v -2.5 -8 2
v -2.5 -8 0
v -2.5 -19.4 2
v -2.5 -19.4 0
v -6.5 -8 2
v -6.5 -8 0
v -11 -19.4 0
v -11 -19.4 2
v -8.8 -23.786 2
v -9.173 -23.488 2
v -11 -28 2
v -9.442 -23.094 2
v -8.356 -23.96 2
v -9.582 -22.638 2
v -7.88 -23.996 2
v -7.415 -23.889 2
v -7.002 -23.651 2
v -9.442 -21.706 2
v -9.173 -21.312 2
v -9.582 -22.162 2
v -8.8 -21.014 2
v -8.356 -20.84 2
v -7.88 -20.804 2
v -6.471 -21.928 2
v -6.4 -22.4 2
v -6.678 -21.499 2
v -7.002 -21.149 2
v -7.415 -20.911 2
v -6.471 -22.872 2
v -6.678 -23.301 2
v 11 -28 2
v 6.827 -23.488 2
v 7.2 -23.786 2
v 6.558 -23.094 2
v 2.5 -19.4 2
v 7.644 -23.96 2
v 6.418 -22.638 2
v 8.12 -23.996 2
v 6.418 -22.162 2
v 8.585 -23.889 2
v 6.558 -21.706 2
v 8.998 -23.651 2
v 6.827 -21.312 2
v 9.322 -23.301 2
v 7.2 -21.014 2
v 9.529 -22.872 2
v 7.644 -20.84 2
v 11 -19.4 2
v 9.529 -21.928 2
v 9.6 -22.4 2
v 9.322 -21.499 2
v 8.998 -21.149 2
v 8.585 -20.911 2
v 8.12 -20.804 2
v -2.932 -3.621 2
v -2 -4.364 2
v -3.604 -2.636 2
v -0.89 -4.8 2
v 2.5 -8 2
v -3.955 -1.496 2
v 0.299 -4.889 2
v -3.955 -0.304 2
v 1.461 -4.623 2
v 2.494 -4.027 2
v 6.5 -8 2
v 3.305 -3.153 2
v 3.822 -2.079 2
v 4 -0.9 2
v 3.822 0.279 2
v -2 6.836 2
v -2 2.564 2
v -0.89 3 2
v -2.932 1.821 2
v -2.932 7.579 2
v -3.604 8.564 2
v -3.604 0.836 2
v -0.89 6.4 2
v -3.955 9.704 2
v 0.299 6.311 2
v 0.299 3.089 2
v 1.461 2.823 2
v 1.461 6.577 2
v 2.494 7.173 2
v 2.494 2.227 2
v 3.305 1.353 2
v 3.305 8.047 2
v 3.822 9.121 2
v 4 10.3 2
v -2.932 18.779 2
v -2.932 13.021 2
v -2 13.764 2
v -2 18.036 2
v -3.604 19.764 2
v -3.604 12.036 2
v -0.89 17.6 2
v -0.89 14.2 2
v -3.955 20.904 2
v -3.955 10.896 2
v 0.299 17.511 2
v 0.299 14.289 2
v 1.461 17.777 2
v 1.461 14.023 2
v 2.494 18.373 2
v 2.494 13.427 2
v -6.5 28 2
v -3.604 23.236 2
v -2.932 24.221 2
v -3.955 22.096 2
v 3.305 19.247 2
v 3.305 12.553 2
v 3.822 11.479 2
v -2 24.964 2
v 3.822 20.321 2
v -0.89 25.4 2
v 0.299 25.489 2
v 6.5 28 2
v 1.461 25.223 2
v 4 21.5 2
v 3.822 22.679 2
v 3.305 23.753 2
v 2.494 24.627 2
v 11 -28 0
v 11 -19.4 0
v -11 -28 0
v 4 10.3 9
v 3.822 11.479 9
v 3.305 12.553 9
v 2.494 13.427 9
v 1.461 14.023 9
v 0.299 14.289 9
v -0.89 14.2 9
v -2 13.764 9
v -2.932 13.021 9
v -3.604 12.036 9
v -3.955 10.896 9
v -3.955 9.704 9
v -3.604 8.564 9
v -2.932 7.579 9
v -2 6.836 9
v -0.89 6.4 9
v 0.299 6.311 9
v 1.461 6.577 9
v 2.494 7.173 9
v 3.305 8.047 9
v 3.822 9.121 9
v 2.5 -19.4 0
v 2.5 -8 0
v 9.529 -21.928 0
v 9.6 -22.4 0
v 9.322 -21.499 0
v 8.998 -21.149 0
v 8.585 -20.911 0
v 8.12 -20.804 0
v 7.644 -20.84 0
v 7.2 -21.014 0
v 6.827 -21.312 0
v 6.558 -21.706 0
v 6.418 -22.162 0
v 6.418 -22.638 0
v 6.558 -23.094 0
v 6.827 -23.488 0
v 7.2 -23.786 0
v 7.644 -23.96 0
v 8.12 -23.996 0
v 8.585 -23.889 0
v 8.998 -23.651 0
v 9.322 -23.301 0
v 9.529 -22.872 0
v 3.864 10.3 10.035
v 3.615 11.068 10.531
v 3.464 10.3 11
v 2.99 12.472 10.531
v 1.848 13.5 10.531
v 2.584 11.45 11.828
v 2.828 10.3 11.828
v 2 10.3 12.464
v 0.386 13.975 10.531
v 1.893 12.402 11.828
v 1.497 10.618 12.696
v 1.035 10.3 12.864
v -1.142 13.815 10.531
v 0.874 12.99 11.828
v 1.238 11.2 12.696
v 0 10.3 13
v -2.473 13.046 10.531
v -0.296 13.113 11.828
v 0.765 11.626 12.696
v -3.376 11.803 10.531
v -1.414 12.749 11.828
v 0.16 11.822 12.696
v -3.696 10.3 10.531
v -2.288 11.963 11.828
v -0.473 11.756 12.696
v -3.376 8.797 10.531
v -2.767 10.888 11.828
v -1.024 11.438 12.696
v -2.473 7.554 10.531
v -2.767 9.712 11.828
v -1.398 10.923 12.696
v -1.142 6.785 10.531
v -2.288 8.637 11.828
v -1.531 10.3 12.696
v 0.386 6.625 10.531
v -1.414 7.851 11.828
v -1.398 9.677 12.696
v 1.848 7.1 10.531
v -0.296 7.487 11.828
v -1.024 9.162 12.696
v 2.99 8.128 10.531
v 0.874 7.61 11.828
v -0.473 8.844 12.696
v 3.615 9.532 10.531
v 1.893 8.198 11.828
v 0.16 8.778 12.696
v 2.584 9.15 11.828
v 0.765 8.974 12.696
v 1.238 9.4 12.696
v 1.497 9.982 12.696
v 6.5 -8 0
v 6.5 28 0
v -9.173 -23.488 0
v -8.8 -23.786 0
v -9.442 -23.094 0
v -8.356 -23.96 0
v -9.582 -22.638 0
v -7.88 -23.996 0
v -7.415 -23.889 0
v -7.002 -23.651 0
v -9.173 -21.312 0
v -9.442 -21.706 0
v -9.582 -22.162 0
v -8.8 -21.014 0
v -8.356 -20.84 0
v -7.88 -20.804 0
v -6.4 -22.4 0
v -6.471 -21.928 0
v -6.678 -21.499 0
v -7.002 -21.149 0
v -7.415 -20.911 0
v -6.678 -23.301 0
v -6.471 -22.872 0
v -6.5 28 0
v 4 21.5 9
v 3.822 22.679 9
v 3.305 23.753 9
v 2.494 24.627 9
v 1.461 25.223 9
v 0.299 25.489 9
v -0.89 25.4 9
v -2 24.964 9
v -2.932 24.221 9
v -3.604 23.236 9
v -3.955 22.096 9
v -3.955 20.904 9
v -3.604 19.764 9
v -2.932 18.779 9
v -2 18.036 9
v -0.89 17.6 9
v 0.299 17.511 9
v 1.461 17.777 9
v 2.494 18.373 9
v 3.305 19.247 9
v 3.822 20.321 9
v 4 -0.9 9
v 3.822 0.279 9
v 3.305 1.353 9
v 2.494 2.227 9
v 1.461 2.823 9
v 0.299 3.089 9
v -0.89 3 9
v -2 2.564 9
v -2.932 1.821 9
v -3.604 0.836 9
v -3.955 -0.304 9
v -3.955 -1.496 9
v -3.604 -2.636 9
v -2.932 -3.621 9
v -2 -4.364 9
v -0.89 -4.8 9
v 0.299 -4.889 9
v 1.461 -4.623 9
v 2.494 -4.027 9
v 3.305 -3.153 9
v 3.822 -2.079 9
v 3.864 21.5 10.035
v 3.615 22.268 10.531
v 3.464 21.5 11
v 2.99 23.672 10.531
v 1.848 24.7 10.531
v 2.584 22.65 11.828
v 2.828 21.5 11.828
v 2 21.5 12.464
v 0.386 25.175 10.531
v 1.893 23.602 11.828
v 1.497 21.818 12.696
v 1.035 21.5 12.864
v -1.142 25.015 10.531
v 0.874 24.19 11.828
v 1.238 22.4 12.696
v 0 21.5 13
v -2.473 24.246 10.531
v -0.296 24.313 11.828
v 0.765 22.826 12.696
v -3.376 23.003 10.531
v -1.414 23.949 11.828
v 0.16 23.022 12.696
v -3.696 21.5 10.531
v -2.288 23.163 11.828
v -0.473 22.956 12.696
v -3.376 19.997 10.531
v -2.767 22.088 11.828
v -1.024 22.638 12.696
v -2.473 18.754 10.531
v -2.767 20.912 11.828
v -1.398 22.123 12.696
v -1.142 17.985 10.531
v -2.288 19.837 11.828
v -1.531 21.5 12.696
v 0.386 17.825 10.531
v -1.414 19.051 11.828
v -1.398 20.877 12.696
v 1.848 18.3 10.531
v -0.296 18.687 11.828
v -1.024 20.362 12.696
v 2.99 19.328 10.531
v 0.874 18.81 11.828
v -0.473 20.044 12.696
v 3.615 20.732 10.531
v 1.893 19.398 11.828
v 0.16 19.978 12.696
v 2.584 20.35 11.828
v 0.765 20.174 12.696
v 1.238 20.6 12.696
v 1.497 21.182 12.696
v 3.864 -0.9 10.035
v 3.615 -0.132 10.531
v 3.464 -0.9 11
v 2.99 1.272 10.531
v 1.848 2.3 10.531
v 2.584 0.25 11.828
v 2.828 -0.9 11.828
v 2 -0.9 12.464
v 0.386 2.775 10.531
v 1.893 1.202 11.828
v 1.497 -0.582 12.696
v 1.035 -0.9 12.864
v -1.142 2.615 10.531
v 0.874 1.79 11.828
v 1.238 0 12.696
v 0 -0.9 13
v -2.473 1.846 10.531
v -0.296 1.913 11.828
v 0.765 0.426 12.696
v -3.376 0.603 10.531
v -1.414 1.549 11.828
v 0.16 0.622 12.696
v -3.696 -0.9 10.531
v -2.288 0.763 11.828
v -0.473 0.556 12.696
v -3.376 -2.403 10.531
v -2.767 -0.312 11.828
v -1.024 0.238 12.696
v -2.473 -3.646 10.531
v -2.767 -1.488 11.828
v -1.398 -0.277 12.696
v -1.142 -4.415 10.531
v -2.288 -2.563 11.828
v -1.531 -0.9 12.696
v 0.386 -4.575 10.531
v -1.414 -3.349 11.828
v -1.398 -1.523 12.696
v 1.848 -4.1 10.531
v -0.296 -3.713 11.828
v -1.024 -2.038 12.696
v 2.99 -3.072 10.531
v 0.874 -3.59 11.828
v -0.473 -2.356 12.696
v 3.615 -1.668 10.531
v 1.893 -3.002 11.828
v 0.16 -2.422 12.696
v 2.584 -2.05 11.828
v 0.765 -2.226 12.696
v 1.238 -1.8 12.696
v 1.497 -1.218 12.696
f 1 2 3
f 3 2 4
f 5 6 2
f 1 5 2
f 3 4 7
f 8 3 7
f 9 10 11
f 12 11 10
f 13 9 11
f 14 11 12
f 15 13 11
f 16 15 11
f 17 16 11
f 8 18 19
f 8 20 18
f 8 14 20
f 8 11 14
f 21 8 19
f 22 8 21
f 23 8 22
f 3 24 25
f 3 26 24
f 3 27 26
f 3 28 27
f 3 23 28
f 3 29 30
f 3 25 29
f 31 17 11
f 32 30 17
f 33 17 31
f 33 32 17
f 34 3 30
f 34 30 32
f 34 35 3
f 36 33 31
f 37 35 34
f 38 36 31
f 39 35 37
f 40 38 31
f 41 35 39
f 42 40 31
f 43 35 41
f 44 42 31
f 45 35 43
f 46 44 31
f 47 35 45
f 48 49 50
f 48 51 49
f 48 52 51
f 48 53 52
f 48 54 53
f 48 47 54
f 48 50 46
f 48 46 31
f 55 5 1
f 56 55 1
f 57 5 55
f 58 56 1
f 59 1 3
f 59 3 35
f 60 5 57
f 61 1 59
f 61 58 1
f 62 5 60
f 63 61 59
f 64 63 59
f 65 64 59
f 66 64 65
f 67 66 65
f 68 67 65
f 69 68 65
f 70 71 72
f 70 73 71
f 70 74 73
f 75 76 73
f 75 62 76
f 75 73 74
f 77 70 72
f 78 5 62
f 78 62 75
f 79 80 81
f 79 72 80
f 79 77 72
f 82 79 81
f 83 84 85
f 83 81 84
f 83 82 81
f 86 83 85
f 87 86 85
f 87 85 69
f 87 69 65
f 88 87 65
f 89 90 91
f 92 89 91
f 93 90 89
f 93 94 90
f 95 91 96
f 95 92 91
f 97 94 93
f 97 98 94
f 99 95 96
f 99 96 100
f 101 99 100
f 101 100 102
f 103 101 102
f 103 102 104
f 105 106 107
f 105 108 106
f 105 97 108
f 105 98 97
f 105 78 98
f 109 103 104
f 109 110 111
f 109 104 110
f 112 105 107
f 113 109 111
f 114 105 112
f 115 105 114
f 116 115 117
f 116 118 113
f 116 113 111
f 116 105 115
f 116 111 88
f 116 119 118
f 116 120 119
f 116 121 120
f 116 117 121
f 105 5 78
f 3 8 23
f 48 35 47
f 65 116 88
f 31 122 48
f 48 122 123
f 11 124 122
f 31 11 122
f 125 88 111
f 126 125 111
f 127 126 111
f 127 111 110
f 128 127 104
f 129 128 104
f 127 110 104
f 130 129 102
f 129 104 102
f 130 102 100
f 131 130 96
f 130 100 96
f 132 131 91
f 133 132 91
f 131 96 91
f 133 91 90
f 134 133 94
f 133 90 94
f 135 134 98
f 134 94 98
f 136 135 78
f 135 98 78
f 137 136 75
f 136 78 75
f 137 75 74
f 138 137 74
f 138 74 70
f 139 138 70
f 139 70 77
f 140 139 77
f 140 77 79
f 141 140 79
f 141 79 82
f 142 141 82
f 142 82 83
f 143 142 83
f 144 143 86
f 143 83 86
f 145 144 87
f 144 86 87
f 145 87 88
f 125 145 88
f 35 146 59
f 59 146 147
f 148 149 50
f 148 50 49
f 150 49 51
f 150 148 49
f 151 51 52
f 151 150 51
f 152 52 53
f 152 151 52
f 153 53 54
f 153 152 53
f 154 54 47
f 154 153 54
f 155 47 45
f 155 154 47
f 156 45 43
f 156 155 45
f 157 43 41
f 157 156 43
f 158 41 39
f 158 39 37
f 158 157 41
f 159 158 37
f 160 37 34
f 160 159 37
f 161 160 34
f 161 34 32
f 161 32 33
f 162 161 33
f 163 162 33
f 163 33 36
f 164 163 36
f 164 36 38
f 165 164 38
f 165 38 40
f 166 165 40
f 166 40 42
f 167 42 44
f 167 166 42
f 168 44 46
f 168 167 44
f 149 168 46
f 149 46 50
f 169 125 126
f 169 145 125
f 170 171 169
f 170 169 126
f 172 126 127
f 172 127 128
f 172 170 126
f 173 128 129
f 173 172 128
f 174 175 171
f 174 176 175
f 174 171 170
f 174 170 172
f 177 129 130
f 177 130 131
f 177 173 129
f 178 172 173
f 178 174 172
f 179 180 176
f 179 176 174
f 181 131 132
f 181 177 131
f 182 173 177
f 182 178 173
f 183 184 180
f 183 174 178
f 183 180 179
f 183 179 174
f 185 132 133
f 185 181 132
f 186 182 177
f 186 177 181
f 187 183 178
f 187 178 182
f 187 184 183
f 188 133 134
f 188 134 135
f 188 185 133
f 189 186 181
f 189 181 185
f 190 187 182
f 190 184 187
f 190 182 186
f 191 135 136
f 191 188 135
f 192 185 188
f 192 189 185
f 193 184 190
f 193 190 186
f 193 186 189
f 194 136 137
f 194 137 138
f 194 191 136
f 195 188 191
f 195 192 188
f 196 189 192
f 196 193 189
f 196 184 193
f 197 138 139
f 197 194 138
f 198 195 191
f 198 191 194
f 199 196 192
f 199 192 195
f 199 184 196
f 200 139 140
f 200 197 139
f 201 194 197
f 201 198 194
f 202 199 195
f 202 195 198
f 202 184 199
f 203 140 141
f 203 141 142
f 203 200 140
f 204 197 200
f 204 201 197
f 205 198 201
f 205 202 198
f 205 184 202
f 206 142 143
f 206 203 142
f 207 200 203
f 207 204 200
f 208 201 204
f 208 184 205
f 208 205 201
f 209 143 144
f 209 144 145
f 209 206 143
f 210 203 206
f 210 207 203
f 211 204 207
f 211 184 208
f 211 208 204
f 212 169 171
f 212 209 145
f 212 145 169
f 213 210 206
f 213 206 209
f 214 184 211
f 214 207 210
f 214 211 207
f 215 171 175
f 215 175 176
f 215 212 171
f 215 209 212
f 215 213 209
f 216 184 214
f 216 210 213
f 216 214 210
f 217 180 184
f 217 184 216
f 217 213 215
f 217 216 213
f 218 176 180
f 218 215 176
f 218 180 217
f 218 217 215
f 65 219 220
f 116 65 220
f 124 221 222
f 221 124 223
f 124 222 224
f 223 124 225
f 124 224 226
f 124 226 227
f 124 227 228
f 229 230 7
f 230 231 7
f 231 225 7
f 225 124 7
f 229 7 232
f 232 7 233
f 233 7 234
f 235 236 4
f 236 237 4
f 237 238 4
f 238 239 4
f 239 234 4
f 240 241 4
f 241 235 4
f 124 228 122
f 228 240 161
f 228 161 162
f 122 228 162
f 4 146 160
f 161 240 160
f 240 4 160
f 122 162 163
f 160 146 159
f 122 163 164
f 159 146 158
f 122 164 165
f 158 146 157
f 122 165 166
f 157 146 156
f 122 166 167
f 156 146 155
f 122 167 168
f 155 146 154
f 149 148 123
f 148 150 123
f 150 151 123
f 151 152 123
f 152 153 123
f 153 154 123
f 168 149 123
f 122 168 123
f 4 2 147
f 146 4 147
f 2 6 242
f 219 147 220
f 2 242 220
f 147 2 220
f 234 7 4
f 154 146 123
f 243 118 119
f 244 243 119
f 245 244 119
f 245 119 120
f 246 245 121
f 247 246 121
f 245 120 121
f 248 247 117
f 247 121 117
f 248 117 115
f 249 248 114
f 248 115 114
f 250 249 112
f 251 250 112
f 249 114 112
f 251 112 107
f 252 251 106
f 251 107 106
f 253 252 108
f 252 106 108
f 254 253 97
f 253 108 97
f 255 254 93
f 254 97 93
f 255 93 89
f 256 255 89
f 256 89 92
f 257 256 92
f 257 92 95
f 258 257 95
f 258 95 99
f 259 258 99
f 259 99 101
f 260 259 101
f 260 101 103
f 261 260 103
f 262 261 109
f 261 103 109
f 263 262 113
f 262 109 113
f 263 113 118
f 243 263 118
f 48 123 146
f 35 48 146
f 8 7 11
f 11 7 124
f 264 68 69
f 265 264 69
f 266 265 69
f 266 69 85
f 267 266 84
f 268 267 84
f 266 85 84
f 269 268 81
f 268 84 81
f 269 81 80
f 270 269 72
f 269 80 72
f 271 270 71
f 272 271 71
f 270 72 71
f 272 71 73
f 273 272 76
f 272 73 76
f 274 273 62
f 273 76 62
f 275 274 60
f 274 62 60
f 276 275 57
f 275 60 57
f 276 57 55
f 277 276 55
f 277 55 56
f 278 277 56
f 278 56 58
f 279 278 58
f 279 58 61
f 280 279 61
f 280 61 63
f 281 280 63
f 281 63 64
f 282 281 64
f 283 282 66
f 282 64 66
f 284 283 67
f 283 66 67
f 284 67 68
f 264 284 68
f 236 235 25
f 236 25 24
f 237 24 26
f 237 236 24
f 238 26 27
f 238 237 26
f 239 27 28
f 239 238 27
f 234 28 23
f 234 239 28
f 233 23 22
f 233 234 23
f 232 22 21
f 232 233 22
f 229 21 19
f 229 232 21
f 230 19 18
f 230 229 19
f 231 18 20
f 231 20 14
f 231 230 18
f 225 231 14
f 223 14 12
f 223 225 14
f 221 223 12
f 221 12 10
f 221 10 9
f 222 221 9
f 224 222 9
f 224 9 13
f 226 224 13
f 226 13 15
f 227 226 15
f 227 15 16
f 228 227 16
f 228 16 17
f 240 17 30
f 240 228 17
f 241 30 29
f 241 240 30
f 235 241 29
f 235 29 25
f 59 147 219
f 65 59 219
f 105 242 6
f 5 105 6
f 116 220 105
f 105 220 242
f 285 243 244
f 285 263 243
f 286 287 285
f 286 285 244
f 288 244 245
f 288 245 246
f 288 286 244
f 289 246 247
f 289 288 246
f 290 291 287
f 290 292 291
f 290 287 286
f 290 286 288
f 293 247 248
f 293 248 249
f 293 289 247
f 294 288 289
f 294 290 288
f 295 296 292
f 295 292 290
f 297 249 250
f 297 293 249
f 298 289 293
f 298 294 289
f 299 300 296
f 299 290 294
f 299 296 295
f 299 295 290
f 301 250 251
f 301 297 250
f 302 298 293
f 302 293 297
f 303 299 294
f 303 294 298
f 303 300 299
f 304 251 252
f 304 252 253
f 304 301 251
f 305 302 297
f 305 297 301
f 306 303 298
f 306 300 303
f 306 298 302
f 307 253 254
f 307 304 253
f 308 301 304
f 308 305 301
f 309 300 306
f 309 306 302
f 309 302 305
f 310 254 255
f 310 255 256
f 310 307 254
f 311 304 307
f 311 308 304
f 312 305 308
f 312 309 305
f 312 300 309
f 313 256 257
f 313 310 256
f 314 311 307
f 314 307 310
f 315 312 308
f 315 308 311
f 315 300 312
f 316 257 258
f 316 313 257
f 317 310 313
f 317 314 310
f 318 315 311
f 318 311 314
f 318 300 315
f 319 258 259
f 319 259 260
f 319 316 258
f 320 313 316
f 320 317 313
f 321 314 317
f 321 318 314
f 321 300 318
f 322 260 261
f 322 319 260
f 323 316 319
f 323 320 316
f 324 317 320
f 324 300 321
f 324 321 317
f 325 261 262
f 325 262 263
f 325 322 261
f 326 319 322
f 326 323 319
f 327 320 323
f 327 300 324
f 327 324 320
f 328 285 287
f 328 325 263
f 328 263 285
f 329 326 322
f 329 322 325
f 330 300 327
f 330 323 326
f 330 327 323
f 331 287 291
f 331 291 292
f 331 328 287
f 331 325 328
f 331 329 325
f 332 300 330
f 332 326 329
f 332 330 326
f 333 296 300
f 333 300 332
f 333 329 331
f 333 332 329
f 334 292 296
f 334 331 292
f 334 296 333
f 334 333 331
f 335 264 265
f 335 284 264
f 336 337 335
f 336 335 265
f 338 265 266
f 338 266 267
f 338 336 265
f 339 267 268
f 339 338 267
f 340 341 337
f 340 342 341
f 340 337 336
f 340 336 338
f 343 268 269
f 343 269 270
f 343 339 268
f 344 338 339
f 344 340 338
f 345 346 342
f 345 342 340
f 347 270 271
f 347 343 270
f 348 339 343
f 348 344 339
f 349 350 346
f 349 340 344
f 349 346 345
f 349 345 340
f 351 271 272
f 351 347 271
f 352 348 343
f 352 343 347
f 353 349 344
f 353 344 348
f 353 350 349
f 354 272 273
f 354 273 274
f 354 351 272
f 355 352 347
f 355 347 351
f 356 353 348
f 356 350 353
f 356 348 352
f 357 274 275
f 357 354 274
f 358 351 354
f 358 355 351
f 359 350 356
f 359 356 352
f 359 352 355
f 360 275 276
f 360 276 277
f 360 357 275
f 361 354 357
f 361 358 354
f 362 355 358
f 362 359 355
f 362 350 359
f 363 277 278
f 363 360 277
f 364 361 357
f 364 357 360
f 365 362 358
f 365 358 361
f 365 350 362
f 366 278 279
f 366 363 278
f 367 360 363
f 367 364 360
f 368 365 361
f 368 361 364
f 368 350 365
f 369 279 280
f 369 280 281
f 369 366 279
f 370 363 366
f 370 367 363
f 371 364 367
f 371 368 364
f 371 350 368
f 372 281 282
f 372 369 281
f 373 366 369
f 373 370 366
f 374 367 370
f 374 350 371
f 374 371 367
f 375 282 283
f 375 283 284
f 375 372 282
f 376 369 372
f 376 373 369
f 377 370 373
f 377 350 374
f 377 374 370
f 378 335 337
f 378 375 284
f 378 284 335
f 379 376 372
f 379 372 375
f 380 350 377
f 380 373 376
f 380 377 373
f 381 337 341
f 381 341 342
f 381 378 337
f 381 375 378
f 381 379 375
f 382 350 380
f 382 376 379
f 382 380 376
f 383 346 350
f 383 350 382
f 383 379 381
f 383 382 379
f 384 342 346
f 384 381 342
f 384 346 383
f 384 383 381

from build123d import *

# Parameters (mm, degrees)
CROQUIS1_R              = 1.6
SALIENTE_EXTRUIR1_DEPTH = 2
CROQUIS2_R              = 4
SALIENTE_EXTRUIR2_DEPTH = 11
REDONDEO1_R             = 4
REDONDEO2_R             = 4


with BuildPart() as part:
    # Croquis1 → Saliente-Extruir1 (new body)
    with BuildSketch(Plane.XY):
        Polygon((-6.5, 28), (-6.5, -8), (-2.5, -8), (-2.5, -19.4), (-11, -19.4), (-11, -28), (11, -28), (11, -19.4), (2.5, -19.4), (2.5, -8), (6.5, -8), (6.5, 28), align=None)
        with Locations((-8, -22.4)):
            Circle(CROQUIS1_R, mode=Mode.SUBTRACT)
        with Locations((8, -22.4)):
            Circle(CROQUIS1_R, mode=Mode.SUBTRACT)
    extrude(amount=SALIENTE_EXTRUIR1_DEPTH)

    # Croquis2 → Saliente-Extruir2 (add)
    with BuildSketch(Plane.XY.offset(2)):
        with Locations((0, 21.5)):
            Circle(CROQUIS2_R)
        with Locations((0, 10.3)):
            Circle(CROQUIS2_R)
        with Locations((0, -0.9)):
            Circle(CROQUIS2_R)
    extrude(amount=SALIENTE_EXTRUIR2_DEPTH)

    # Redondeo1
    redondeo1_edges = [part.edges().sort_by_distance(p)[0] for p in [
        (-4, 21.5, 13),
    ]]
    fillet(redondeo1_edges, radius=REDONDEO1_R)

    # Redondeo2
    redondeo2_edges = [part.edges().sort_by_distance(p)[0] for p in [
        (-4, 10.3, 13),
        (-4, -0.9, 13),
    ]]
    fillet(redondeo2_edges, radius=REDONDEO2_R)


solid = part.part
